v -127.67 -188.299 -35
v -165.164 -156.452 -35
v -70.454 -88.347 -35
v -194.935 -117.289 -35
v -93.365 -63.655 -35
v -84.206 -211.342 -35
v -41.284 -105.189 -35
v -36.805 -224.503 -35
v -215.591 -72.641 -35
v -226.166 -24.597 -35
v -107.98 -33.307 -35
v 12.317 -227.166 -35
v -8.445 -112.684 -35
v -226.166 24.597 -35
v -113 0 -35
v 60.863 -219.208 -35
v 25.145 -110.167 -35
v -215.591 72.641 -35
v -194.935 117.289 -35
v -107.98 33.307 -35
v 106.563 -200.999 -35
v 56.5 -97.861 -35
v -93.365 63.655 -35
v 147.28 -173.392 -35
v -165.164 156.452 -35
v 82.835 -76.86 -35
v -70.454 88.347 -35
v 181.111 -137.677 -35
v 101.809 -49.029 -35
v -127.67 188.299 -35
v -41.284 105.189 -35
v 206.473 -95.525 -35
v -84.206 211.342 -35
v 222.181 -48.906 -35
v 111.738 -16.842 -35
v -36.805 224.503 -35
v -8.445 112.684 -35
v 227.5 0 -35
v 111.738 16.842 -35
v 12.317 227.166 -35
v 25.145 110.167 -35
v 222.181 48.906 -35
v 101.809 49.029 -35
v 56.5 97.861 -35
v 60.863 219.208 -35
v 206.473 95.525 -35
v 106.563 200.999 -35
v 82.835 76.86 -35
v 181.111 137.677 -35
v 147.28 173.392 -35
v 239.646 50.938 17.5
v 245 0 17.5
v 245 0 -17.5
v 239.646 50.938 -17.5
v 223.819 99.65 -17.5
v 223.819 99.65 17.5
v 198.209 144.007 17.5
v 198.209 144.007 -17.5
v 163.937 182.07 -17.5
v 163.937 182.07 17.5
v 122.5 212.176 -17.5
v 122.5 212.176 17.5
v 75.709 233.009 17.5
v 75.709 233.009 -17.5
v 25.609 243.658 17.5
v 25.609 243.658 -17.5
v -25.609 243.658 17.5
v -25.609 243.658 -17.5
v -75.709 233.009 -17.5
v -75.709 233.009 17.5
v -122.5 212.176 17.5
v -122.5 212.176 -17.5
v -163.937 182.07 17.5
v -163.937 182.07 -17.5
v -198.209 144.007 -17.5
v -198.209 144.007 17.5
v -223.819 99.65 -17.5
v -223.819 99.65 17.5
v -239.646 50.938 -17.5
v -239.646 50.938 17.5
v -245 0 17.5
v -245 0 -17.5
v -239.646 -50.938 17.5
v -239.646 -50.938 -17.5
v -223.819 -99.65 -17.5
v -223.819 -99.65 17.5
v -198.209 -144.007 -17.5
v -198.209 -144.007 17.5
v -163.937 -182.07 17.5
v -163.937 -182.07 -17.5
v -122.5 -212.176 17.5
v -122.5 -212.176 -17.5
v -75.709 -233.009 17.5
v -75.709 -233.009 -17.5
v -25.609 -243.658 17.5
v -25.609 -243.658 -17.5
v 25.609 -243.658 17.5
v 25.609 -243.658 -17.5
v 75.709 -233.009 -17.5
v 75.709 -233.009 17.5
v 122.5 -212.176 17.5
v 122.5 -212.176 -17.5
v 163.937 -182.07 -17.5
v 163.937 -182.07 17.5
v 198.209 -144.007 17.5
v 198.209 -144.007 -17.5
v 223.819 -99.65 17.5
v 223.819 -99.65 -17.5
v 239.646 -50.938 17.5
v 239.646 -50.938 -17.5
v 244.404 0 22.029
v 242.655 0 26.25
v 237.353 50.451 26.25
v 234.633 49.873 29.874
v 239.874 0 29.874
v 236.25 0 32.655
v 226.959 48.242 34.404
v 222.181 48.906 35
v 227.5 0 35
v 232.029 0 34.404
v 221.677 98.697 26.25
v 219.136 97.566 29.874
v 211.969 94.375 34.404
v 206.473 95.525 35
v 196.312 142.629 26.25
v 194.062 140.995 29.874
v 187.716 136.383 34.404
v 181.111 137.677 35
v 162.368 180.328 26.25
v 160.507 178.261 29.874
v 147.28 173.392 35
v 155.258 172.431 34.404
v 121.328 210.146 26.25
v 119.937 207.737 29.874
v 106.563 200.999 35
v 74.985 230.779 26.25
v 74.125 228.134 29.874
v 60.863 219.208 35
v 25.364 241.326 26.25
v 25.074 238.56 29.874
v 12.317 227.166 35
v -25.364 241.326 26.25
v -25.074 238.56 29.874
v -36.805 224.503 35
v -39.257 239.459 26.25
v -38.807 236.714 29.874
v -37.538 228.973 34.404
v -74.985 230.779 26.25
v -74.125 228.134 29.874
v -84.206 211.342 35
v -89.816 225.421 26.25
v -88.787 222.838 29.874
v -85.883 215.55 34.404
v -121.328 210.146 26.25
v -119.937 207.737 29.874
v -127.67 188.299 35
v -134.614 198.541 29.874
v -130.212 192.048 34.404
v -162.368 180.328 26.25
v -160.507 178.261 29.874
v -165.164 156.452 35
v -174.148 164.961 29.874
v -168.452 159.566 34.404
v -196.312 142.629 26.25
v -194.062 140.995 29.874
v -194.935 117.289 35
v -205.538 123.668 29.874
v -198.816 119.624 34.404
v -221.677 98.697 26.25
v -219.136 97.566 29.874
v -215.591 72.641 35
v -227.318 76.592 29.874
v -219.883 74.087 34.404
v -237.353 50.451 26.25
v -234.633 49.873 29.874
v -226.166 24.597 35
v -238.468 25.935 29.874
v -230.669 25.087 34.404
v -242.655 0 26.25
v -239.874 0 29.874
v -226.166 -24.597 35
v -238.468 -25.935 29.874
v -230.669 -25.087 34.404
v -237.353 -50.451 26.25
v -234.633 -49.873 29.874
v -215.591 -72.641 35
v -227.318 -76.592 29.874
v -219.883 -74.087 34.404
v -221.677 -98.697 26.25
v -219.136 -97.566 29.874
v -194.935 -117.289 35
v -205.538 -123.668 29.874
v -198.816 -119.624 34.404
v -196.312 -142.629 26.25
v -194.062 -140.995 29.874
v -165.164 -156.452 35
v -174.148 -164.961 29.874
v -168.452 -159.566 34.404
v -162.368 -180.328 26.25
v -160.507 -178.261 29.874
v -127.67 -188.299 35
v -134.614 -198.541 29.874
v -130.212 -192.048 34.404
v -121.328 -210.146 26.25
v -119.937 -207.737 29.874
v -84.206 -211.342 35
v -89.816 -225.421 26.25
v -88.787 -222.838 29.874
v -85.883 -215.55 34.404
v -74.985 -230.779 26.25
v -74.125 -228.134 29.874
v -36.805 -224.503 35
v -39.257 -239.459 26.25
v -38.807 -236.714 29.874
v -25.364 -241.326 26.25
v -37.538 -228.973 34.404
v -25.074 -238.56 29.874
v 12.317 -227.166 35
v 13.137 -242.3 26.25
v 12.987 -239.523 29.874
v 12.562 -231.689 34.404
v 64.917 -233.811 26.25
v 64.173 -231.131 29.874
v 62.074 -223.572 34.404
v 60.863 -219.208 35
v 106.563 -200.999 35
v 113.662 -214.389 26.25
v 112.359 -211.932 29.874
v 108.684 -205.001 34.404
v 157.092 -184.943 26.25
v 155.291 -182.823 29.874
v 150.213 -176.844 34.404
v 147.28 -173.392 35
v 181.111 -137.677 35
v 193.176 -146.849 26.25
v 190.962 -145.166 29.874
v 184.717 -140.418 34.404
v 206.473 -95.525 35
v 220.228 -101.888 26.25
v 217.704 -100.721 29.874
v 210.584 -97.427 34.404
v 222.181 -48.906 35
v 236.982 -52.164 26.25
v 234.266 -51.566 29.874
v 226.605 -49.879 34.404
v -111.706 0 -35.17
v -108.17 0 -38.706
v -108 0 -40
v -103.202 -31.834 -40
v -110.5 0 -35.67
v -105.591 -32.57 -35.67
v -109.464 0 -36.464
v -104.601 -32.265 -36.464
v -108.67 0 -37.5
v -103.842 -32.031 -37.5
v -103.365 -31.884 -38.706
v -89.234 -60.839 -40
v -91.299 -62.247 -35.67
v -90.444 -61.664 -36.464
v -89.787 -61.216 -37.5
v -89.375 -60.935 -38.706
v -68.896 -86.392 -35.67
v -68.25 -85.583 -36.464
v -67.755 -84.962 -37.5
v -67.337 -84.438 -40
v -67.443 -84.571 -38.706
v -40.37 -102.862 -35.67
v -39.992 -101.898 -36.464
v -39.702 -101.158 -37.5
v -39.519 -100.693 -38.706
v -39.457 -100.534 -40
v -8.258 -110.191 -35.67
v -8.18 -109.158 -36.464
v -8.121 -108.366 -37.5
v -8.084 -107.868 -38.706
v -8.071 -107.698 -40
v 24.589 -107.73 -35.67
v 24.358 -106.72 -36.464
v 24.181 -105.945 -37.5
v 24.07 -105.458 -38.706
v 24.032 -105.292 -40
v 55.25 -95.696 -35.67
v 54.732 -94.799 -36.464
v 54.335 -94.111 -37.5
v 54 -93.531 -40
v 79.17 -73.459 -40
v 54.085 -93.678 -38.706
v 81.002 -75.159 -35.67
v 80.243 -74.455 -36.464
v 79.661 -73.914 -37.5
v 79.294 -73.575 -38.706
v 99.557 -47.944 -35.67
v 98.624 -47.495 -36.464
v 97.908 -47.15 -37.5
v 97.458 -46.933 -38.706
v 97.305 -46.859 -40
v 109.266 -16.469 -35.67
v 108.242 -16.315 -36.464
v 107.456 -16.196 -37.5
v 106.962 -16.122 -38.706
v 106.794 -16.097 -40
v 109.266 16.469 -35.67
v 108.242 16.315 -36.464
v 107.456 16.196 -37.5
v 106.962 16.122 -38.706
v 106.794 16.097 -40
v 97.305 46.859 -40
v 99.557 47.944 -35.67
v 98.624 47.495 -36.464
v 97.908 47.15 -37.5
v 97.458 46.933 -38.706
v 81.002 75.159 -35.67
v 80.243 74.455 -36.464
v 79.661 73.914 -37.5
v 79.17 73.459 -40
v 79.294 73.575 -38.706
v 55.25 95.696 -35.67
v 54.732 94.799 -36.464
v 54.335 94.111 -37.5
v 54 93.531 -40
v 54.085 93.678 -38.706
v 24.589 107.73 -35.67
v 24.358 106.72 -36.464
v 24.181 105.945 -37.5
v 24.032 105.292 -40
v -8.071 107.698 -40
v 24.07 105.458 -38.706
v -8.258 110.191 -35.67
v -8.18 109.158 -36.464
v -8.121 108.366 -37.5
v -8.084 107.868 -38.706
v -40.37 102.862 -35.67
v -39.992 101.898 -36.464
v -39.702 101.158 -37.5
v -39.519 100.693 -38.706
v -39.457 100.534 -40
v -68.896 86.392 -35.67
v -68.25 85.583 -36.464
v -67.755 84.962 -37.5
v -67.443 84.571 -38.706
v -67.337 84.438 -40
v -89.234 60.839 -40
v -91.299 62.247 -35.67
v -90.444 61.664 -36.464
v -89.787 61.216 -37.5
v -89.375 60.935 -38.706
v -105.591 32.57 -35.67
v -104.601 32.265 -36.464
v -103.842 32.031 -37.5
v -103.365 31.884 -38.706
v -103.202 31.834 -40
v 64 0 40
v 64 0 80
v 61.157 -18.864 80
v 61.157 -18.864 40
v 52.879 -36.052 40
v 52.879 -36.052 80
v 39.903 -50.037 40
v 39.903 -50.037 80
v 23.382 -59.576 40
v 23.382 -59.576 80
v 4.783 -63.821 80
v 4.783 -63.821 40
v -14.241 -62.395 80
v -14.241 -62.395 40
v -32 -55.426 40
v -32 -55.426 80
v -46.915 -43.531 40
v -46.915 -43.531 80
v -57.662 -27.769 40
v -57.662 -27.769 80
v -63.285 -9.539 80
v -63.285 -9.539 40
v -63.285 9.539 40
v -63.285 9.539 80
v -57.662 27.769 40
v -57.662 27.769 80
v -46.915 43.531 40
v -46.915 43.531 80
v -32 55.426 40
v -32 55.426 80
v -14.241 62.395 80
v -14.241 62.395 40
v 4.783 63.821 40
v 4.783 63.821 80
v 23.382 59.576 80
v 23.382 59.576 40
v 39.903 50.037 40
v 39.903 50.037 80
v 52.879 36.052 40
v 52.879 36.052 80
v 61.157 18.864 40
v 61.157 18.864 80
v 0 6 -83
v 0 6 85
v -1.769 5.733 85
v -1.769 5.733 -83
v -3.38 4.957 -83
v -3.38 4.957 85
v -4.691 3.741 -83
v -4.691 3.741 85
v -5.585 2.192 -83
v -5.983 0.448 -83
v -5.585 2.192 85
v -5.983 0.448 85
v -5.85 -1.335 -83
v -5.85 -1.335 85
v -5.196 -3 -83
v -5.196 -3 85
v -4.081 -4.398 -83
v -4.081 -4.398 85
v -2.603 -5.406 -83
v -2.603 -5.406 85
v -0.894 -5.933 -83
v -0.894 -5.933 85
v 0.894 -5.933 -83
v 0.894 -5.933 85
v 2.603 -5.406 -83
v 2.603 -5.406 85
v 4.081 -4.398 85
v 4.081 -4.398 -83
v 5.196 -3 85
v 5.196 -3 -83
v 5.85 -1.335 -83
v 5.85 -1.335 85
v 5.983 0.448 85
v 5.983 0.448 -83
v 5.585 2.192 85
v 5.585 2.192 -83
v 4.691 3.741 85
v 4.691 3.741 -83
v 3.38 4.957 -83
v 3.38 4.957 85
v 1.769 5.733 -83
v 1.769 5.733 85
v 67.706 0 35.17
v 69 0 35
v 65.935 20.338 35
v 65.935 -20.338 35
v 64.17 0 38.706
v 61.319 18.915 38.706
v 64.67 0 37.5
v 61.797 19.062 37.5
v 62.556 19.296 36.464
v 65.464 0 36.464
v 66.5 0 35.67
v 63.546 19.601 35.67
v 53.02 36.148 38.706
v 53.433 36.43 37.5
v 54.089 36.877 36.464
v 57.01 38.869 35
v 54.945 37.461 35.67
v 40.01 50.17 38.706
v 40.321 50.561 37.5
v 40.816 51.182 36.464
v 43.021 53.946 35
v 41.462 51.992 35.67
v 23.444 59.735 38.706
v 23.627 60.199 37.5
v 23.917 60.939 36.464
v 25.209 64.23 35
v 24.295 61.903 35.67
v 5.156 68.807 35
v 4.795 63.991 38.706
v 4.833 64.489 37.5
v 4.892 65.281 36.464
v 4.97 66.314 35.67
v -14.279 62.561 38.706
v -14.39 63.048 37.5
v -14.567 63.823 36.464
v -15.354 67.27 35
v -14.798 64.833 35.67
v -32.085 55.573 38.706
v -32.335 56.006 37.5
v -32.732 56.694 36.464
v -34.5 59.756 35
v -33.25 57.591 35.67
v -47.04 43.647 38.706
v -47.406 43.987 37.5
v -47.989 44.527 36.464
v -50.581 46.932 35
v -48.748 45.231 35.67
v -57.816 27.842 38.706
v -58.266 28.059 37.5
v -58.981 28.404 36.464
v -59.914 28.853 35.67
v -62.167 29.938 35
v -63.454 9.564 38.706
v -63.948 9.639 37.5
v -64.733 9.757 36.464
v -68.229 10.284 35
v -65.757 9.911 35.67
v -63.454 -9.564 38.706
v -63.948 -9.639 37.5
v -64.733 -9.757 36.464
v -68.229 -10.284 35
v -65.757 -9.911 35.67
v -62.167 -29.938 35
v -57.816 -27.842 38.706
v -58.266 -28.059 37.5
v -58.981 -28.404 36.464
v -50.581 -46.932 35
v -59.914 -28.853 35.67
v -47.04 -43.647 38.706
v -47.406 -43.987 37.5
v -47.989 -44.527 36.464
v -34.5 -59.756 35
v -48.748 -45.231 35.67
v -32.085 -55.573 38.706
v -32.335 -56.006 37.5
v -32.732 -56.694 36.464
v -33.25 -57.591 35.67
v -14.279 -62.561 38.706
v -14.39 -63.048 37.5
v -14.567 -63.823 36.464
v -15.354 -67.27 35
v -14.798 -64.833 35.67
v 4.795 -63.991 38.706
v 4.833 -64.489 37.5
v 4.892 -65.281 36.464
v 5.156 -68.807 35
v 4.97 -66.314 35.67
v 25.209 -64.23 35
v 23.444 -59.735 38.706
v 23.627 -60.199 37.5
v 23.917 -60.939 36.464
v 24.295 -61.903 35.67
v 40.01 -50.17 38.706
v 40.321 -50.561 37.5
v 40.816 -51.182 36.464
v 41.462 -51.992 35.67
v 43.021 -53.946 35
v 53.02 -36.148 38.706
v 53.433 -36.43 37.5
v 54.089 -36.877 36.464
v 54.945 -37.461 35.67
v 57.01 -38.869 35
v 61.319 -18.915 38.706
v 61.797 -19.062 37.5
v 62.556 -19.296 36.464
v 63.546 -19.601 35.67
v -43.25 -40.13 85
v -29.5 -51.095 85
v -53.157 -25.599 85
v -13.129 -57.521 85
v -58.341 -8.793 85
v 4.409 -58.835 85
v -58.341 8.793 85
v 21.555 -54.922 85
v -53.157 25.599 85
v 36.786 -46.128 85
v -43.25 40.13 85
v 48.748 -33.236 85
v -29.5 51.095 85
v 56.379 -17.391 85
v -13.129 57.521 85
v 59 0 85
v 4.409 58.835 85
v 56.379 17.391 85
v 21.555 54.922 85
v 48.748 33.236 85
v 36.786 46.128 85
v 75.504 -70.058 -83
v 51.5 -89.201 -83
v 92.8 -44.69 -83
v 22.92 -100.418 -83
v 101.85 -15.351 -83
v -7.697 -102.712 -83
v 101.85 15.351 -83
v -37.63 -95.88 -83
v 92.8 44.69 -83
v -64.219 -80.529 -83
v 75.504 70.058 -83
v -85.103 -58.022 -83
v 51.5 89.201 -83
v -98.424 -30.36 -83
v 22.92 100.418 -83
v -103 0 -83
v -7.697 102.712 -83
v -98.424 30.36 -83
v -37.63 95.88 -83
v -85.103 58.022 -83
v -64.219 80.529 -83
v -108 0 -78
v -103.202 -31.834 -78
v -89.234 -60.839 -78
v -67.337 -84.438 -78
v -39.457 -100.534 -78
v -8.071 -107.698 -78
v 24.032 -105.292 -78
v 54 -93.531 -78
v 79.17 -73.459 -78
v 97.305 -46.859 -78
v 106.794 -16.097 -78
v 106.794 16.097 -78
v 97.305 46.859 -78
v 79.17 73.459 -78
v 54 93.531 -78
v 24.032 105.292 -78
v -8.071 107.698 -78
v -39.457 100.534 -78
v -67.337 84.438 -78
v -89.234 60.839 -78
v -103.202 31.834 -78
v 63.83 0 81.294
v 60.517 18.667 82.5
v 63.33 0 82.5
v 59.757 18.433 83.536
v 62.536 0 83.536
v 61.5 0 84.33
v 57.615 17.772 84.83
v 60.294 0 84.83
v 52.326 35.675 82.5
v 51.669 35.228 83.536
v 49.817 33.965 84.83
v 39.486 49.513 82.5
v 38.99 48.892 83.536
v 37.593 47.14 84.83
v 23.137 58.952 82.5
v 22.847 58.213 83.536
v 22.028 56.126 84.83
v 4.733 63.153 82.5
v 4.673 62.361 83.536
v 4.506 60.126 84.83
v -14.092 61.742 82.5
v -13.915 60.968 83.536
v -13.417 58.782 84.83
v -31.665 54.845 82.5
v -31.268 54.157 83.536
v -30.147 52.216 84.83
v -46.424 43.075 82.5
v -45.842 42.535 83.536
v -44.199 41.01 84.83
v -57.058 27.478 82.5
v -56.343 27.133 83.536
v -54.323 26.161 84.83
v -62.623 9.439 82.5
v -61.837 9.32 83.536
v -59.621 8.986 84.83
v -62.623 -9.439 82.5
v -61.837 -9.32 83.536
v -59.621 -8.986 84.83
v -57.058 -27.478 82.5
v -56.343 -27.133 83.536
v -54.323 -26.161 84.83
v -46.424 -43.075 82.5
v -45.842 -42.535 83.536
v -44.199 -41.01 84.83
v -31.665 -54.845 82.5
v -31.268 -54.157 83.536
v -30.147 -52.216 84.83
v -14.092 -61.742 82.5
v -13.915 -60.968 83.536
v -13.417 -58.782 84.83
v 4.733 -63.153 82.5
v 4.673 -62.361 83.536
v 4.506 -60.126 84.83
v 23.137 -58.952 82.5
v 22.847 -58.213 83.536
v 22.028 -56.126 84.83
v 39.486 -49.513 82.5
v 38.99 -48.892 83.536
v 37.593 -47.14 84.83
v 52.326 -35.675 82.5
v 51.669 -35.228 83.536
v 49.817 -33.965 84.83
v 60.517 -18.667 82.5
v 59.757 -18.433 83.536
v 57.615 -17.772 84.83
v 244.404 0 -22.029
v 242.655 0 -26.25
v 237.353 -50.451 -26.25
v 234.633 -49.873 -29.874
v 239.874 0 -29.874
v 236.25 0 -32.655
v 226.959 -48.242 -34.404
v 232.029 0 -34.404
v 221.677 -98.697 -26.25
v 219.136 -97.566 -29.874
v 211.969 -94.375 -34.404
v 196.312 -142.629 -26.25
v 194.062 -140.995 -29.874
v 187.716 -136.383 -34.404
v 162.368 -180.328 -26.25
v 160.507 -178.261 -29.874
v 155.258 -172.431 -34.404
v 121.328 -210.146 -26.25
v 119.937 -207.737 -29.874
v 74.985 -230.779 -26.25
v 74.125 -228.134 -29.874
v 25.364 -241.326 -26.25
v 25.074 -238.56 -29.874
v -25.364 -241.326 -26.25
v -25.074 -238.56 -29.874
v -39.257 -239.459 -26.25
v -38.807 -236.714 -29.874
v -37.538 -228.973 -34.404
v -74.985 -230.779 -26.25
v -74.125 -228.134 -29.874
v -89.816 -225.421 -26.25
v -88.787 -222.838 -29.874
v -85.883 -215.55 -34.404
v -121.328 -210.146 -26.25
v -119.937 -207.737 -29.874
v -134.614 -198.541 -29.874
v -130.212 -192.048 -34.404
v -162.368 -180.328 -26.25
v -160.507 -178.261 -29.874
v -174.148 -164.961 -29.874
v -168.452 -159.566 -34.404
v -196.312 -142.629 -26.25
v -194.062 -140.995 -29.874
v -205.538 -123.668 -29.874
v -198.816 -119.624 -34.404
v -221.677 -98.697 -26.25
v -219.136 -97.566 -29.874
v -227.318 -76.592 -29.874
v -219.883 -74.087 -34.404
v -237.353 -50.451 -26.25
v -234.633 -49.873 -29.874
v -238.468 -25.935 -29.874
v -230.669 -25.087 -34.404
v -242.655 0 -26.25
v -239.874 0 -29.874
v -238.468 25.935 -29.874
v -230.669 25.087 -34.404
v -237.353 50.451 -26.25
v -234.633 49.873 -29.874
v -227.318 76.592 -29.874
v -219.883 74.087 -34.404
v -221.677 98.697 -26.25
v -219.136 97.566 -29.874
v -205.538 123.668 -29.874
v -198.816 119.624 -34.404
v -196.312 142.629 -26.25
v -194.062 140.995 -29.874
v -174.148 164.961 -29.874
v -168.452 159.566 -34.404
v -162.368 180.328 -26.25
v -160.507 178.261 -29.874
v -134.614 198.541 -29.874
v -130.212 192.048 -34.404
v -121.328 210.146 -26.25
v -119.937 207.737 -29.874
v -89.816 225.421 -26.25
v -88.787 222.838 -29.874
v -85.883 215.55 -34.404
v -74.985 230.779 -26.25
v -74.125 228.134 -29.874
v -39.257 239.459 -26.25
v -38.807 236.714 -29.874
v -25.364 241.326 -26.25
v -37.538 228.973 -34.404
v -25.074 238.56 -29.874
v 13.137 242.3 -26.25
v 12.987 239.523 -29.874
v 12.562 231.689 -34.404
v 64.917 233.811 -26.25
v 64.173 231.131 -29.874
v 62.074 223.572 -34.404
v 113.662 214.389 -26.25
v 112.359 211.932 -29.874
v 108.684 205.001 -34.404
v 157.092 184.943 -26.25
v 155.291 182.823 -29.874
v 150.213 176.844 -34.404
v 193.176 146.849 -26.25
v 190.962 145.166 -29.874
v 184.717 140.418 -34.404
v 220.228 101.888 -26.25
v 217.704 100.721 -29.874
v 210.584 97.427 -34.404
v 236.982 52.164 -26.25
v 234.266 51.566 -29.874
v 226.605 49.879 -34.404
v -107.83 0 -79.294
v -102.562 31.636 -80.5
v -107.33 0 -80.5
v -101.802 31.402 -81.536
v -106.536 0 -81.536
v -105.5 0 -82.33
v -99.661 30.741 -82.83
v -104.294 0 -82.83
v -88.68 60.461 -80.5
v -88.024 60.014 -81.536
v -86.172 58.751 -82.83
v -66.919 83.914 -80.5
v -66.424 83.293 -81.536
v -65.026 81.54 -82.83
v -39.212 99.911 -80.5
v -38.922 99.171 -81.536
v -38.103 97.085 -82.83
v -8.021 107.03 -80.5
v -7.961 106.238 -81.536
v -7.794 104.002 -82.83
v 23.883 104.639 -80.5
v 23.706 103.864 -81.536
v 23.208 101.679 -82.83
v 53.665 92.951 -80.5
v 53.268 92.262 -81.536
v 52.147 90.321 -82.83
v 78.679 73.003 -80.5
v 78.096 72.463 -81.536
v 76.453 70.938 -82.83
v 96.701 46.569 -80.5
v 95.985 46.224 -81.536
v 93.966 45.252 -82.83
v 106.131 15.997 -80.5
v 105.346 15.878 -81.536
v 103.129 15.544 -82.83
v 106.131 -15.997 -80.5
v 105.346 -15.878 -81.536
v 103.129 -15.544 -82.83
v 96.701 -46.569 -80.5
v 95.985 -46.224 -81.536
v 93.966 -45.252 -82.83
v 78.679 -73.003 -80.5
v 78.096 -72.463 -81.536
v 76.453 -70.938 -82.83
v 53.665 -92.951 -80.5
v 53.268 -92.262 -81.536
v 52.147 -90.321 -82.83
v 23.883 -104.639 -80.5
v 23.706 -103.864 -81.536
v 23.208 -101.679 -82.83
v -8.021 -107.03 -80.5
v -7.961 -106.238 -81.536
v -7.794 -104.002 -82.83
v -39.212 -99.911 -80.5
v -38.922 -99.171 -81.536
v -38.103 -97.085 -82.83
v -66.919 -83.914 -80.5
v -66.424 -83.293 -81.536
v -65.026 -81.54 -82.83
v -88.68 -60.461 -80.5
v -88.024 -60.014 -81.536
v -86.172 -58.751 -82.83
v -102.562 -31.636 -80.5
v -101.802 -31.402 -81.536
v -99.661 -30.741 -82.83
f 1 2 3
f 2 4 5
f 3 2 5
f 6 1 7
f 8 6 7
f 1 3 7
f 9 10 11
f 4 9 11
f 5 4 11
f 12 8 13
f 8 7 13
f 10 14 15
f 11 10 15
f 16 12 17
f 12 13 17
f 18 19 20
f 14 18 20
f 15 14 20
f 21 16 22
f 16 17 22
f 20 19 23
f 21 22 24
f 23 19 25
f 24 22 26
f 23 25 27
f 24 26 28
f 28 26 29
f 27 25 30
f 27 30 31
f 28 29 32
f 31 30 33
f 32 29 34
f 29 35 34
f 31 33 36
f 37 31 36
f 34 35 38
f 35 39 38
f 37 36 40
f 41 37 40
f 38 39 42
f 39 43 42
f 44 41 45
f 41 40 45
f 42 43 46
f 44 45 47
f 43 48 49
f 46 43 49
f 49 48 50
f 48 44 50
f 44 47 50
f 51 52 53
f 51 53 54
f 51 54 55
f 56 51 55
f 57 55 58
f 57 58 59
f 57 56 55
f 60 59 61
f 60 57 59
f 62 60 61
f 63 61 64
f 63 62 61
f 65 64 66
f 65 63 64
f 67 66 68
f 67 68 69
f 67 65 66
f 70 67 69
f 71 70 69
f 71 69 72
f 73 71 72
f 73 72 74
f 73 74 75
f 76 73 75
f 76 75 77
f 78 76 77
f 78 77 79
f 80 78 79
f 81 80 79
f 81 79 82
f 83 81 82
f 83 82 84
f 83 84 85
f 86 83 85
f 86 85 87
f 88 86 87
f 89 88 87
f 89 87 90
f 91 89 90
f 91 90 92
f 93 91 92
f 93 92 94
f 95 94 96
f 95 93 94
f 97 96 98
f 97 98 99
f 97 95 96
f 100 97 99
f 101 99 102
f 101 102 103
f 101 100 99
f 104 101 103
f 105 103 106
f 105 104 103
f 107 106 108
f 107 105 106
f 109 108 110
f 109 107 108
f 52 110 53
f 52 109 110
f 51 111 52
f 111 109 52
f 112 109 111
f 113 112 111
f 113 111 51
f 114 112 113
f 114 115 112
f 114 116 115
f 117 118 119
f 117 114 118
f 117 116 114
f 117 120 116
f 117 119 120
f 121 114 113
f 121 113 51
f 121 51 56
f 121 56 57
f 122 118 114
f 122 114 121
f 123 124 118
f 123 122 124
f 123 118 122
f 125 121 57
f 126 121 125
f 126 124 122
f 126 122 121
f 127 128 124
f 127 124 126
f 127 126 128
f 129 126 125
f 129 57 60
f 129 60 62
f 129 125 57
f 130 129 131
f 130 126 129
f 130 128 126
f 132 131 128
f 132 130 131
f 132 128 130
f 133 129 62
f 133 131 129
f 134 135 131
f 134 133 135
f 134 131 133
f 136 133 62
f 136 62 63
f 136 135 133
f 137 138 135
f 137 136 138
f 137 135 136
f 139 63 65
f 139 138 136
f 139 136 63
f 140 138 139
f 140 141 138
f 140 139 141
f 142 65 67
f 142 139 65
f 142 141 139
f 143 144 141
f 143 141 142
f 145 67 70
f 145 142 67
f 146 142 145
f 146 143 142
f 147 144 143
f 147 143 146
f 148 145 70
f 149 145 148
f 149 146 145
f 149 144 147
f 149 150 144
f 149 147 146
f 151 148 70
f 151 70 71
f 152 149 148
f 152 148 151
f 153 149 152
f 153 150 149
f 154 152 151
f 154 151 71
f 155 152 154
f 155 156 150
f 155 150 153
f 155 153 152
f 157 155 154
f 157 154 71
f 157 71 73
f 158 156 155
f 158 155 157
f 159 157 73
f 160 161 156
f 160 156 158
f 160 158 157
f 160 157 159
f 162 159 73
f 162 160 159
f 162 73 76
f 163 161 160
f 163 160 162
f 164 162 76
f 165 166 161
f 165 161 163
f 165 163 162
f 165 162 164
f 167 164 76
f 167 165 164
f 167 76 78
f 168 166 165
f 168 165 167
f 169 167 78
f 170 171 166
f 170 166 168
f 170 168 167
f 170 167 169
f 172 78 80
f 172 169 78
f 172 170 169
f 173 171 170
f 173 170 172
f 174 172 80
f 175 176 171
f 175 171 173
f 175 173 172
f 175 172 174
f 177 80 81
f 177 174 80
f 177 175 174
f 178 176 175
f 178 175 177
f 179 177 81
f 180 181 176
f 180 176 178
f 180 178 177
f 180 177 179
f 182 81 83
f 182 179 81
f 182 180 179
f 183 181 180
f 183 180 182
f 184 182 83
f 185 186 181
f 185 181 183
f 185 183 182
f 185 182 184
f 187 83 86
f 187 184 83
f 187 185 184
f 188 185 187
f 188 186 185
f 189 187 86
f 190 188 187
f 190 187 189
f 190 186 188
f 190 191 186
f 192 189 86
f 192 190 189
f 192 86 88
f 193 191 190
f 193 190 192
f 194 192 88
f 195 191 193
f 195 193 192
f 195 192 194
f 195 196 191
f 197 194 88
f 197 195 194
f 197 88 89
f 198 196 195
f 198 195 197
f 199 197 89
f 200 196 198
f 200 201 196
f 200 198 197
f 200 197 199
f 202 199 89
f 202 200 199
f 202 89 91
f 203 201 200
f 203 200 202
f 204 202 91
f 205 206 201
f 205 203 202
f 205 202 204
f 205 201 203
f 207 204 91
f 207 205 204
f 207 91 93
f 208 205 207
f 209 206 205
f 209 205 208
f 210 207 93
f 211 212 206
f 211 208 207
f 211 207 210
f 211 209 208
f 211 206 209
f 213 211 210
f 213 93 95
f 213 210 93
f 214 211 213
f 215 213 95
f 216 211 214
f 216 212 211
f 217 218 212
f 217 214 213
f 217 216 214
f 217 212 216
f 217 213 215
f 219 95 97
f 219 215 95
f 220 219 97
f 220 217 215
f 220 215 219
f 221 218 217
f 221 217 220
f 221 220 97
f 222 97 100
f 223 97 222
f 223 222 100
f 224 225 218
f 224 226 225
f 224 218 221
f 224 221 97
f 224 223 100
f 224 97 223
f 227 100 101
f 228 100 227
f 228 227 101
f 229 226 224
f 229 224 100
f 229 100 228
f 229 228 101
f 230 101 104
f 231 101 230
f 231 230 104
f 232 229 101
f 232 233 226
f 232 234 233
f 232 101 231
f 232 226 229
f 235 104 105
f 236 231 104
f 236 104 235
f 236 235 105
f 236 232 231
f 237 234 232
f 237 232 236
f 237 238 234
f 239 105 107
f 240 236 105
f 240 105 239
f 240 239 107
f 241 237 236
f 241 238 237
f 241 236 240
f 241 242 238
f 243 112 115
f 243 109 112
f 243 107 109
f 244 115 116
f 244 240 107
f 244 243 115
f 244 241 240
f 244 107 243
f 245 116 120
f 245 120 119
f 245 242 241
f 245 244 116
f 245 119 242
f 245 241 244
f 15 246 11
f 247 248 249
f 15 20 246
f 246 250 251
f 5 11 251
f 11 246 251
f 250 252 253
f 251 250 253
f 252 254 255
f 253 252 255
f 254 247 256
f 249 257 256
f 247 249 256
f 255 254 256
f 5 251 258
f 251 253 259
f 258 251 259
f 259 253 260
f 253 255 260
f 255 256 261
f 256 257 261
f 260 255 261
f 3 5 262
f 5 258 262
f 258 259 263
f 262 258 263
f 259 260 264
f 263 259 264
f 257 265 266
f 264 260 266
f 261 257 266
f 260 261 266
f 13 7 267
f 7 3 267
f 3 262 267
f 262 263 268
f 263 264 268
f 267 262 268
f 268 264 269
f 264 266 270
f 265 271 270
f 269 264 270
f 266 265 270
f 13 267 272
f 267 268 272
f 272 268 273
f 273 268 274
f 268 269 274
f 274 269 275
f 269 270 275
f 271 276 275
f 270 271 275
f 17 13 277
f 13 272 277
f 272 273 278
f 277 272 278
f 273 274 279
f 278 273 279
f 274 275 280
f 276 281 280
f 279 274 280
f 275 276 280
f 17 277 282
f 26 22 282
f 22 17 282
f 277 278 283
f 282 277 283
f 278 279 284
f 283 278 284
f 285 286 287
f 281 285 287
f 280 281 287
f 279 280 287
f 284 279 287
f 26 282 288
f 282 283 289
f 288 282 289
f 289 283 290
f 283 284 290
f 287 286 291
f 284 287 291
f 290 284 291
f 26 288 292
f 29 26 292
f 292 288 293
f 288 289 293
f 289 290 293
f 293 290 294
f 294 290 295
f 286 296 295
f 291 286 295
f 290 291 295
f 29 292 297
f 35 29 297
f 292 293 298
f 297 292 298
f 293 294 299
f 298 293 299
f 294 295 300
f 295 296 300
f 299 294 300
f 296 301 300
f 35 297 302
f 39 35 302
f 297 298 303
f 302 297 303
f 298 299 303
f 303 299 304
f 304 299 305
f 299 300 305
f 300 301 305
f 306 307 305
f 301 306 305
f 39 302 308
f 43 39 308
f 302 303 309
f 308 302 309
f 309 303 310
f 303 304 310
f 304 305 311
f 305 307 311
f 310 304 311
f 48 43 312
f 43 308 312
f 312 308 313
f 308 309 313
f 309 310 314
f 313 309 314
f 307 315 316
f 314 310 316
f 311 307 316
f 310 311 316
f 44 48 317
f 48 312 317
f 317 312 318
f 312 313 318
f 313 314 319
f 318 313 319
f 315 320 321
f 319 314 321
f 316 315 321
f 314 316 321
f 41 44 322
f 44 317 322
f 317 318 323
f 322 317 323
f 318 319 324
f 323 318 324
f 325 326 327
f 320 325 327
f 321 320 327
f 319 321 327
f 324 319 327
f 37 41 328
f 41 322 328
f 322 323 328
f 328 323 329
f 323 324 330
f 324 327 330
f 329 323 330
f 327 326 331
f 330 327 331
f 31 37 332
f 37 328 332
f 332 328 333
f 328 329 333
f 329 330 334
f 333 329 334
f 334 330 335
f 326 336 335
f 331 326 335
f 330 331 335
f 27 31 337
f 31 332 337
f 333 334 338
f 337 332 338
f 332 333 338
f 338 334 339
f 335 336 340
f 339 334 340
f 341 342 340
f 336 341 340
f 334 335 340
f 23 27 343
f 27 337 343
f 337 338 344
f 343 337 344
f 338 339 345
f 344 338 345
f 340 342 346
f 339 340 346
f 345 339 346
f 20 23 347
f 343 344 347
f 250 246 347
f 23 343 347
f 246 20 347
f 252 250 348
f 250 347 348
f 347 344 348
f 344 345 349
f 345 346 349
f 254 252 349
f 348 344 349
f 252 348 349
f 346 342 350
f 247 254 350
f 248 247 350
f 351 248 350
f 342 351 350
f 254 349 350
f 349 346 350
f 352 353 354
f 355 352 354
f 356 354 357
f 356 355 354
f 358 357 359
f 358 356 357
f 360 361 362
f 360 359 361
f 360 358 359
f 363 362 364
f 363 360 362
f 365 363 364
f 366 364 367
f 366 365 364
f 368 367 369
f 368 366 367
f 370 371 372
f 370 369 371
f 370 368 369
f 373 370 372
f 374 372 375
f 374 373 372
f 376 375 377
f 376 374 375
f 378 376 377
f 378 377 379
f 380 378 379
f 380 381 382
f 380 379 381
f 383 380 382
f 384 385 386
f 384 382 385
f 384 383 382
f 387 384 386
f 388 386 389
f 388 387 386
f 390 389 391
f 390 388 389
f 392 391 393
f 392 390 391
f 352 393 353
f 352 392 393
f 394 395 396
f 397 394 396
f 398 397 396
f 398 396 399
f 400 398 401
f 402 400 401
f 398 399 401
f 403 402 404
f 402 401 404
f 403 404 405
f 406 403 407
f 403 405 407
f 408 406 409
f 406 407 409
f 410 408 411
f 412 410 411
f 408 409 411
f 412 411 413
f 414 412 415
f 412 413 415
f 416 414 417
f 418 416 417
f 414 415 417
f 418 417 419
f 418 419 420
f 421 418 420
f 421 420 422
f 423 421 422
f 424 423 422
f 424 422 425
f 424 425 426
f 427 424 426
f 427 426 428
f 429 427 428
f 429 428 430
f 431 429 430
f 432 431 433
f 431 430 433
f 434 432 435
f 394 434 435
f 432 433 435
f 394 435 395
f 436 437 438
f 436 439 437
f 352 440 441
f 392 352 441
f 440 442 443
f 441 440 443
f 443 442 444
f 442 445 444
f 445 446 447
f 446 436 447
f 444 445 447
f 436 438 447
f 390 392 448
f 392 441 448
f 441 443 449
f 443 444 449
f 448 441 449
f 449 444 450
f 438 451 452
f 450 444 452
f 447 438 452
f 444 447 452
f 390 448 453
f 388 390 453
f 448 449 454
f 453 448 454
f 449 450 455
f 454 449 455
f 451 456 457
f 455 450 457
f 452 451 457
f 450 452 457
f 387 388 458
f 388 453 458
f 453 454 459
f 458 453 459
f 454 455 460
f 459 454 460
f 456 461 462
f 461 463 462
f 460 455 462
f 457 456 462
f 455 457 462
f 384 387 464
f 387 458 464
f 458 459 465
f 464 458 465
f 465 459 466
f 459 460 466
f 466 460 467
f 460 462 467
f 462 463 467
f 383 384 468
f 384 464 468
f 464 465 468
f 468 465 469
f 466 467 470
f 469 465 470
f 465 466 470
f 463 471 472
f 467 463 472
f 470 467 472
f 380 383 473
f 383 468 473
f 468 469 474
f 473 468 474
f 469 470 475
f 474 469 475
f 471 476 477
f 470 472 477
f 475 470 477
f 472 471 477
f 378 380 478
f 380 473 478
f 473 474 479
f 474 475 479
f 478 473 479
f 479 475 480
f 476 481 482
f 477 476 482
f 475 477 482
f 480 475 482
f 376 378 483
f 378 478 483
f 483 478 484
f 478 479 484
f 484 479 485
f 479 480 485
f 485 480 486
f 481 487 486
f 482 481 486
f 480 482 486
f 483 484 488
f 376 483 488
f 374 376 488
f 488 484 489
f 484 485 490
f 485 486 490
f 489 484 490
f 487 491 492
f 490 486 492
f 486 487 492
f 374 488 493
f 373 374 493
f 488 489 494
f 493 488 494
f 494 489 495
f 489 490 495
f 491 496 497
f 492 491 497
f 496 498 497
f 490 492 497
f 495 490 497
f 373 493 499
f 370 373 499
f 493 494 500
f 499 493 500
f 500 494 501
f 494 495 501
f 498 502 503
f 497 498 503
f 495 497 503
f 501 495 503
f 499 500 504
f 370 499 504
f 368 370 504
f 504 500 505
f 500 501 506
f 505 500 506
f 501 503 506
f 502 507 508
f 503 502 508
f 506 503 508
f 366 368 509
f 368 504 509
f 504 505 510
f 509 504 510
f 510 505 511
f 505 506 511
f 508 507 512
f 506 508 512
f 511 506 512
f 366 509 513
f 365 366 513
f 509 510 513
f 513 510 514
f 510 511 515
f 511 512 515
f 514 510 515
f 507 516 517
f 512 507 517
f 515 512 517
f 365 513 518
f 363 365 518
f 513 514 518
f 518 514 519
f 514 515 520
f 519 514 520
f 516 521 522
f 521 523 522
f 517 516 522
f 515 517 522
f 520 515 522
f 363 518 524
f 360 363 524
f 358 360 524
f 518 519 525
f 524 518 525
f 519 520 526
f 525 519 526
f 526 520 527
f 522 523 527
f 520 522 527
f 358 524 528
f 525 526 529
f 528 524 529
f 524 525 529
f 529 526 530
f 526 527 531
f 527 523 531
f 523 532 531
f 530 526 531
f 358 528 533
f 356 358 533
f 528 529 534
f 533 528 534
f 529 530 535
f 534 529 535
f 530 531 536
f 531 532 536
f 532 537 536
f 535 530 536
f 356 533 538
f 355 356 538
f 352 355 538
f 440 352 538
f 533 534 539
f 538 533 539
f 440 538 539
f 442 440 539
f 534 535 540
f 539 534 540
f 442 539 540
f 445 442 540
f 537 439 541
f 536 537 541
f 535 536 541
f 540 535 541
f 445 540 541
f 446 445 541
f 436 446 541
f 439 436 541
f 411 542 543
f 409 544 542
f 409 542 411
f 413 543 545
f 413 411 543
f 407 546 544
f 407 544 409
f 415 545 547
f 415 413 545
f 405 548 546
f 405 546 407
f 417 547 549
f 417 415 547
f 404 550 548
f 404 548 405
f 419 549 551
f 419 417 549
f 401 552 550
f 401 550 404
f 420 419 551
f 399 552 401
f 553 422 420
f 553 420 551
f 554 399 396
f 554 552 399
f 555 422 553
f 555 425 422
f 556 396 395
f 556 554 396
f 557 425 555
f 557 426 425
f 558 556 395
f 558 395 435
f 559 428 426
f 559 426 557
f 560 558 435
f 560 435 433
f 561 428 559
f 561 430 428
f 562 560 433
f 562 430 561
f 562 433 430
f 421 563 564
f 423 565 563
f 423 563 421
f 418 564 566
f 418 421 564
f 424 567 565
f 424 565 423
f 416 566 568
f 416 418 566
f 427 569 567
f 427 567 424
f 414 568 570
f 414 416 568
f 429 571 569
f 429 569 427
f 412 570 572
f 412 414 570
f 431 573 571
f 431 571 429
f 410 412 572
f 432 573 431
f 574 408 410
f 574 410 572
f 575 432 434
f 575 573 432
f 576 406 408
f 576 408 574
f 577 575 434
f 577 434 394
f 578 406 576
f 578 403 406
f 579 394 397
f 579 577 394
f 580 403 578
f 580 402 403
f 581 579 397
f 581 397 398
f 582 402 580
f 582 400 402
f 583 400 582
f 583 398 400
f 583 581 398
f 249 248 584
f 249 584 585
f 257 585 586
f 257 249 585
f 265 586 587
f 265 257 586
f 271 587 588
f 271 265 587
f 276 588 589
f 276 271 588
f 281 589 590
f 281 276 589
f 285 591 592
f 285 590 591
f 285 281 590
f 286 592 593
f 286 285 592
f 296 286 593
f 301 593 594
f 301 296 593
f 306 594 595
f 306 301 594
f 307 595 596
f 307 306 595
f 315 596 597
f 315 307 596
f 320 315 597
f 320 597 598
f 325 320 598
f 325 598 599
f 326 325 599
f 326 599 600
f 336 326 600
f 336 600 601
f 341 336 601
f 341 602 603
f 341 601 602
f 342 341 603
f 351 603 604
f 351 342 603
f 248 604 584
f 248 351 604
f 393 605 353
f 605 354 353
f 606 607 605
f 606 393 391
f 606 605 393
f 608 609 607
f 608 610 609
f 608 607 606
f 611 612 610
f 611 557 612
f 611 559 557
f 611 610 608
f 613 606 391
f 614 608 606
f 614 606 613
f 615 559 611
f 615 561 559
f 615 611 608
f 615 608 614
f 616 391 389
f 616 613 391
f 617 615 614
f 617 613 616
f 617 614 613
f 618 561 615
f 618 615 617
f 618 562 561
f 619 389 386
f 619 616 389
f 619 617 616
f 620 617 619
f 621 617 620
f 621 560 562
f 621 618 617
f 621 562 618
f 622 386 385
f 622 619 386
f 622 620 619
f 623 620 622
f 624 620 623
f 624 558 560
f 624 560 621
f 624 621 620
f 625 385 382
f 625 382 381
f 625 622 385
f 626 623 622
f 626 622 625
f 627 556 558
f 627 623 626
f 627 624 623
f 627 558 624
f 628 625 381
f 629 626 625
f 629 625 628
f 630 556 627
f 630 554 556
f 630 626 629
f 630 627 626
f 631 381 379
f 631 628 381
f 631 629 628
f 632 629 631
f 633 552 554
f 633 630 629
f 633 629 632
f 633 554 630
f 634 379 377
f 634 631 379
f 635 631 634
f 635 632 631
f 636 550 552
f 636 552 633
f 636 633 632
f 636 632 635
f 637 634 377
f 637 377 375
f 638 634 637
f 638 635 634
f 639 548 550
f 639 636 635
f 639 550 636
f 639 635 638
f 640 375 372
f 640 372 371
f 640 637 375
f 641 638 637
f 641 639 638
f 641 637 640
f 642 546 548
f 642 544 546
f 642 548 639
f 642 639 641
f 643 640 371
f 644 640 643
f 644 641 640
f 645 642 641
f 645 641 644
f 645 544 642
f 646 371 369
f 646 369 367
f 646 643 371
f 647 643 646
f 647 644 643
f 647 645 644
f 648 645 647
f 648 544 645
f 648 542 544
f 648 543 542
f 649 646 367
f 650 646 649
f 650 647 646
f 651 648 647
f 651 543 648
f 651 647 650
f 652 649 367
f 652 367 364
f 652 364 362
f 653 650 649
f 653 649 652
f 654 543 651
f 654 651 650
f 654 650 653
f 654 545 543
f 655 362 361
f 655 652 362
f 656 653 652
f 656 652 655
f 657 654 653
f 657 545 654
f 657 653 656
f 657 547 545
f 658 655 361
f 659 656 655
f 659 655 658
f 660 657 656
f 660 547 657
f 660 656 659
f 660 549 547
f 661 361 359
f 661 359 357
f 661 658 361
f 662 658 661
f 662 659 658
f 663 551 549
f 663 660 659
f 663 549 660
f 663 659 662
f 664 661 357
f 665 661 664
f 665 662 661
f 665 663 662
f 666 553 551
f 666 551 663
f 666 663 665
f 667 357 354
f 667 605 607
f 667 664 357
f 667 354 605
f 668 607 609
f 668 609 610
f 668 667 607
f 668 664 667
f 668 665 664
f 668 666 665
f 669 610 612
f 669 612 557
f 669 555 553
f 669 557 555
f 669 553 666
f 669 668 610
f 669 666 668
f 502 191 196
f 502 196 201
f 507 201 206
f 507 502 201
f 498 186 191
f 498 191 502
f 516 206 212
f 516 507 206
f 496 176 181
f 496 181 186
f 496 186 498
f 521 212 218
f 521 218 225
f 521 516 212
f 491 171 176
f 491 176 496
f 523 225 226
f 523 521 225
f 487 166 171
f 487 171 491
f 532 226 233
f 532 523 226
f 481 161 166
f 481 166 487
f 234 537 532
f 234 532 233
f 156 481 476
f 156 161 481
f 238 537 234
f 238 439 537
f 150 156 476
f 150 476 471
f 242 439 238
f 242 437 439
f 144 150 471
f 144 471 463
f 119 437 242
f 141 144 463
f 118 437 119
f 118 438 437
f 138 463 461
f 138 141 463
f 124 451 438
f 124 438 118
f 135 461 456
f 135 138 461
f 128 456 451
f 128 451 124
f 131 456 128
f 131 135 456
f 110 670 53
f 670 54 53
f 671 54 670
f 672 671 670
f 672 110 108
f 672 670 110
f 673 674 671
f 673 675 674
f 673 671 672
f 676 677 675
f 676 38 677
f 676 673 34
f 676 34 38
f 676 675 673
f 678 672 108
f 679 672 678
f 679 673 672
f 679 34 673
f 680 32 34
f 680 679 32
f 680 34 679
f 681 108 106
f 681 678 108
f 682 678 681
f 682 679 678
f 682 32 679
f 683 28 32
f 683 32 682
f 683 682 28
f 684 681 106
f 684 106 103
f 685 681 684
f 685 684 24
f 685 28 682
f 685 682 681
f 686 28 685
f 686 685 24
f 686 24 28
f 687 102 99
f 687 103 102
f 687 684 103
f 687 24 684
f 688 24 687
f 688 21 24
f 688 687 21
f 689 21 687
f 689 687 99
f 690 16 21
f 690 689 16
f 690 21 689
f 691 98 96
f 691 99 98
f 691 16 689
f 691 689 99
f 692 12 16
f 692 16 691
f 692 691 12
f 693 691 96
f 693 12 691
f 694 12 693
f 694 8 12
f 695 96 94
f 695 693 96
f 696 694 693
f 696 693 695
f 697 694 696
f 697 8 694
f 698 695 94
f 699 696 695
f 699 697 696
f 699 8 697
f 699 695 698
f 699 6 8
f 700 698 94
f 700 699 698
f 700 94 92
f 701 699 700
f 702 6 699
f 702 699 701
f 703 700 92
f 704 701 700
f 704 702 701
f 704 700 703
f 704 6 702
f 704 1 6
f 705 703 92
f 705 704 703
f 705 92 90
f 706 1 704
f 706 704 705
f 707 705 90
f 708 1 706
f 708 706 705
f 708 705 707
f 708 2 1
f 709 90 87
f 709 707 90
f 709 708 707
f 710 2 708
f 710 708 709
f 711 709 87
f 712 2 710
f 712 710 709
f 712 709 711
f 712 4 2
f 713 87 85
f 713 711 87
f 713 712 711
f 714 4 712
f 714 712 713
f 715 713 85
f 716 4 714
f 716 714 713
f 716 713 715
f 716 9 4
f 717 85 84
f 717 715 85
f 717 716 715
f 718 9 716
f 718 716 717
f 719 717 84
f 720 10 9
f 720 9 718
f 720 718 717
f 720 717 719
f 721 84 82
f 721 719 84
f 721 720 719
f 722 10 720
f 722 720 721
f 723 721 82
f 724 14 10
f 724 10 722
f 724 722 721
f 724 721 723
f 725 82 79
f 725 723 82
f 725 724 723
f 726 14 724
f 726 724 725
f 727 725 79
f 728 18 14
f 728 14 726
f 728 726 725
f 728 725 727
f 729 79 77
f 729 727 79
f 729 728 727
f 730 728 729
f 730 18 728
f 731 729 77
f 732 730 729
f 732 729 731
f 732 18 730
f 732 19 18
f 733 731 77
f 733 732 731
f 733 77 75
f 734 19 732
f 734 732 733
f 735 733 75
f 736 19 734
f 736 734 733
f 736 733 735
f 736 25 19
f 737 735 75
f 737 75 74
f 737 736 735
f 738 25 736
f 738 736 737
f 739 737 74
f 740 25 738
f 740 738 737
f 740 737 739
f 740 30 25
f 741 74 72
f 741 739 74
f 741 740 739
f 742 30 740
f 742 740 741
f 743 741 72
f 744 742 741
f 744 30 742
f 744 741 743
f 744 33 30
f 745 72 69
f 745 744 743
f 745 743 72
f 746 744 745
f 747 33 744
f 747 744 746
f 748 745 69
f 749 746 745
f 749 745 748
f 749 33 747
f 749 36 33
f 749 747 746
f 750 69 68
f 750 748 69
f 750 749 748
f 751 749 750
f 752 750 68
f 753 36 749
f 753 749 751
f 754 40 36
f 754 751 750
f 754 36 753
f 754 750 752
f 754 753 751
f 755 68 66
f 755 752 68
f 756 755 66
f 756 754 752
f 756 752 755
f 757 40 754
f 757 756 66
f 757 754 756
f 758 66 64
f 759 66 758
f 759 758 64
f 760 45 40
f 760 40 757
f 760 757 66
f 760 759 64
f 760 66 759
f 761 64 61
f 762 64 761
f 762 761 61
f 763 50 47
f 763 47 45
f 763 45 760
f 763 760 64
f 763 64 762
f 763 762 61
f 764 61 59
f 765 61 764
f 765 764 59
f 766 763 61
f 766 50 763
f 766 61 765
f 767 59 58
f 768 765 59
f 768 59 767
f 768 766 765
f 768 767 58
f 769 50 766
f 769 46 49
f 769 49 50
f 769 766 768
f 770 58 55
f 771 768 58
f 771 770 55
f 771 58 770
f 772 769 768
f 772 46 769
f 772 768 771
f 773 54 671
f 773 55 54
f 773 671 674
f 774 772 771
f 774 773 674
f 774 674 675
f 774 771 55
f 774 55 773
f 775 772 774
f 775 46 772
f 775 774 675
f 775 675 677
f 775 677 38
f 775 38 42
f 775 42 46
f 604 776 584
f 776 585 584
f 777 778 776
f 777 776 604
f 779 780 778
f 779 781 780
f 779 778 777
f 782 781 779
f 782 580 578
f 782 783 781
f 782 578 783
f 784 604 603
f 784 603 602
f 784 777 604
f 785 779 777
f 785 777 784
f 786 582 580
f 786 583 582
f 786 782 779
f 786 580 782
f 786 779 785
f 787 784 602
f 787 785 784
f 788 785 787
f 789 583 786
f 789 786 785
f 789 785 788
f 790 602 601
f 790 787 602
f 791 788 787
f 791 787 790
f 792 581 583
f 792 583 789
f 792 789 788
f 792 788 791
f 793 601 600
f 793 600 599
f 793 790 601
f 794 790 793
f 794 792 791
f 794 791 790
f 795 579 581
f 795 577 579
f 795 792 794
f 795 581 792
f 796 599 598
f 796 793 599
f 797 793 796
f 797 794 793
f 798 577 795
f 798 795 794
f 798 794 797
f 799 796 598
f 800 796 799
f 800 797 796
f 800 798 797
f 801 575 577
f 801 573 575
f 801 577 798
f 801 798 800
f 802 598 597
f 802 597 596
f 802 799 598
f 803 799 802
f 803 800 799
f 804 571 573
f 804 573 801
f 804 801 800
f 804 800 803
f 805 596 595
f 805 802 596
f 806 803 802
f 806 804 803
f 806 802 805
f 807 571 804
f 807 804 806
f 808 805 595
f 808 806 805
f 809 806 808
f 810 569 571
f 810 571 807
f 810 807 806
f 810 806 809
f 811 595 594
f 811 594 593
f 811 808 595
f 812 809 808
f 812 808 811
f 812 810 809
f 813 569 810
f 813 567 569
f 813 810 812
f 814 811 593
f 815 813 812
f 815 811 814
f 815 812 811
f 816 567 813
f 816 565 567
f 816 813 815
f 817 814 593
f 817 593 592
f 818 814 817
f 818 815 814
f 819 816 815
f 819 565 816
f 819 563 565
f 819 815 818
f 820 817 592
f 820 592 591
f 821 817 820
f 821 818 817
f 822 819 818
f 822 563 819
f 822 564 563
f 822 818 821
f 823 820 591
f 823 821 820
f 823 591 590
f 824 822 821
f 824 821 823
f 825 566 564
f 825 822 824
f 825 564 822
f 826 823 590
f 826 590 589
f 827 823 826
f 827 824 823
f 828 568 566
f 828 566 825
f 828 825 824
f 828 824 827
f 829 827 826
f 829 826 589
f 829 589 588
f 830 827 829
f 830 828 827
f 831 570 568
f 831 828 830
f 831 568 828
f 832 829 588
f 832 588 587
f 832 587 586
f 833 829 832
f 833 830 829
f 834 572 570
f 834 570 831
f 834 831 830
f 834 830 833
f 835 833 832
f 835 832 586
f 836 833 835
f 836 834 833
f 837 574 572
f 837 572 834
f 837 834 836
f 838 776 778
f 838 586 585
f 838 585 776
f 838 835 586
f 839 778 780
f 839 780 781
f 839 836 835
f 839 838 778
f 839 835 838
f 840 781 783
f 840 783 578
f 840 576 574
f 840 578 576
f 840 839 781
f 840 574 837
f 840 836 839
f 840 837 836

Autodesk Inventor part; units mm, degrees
ref_plane "YZ Plane" through (0, 0, 0) normal (1, 0, 0) x (0, 1, 0)
ref_plane "XZ Plane" through (0, 0, 0) normal (0, 1, 0) x (-1, 0, 0)
ref_plane "XY Plane" through (0, 0, 0) normal (0, 0, 1) x (1, 0, 0)
sketch "スケッチ1" plane through (0, 0, 0) normal (0, 0, 1) x (1, 0, 0)
  circle A0 centre (0, 0) radius 245
  dimension "d0" = 490
extrude "押し出し1" add sketch "スケッチ1" along normal mid plane 70
fillet "フィレット1" radius 17.5 2 edges at (-245, 0, 35) (-245, 0, -35)
sketch "スケッチ8" plane through (0, 0, 35) normal (0, 0, 1) x (1, 0, 0)
  circle A0 centre (0, 0) radius 64
  dimension "d11" = 128
extrude "押し出し2" add sketch "スケッチ8" along normal blind 50
sketch "スケッチ9" plane through (0, 0, -35) normal (0, 0, -1) x (-1, 0, 0)
  circle A0 centre (0, 0) radius 108
  dimension "d14" = 216
extrude "押し出し3" add sketch "スケッチ9" along normal blind 48
fillet "フィレット2" radius 5 1 edges at (-64, 0, 85)
fillet "フィレット3" radius 5 1 edges at (-64, 0, 35)
fillet "フィレット4" radius 5 2 edges at (108, 0, -83) (108, 0, -35)
sketch "スケッチ10" plane through (0, 0, -83) normal (0, 0, -1) x (-1, 0, 0)
  point P0 (0, 0)
  point P1 (0, 0)
hole "穴2" at (0, 0, -83) direction (0, 0, 1) diameter 12 end through all
sketch "スケッチ12" plane through (0, 0, 85) normal (0, 0, 1) x (1, 0, 0)
  line L0 (-51.2549, 22.4229) -> (29.3453, 22.4229) construction
  line L1 (29.3453, 22.4229) -> (29.3453, -28.267) construction
  line L2 (29.3453, -28.267) -> (-51.2549, -28.267) construction
  line L3 (-51.2549, -28.267) -> (-51.2549, 22.4229) construction
  point P0 (0, 0)
sketch "スケッチ13" plane through (0, 0, -83) normal (0, 0, -1) x (-1, 0, 0)
  line L0 (-79.0903, 45.7594) -> (75.7007, 45.7594) construction
  line L1 (75.7007, 45.7594) -> (75.7007, -24.292) construction
  line L2 (75.7007, -24.292) -> (-79.0903, -24.292) construction
  line L3 (-79.0903, -24.292) -> (-79.0903, 45.7594) construction
  point P0 (0, 0)
sketch "スケッチ14" plane through (0, 0, -35) normal (0, 0, -1) x (-1, 0, 0)
  line L0 (-67.9, 178.6198) -> (94.9078, 178.6198) construction
  line L1 (94.9078, 178.6198) -> (94.9078, 134.9225) construction
  line L2 (94.9078, 134.9225) -> (-67.9, 134.9225) construction
  line L3 (-67.9, 134.9225) -> (-67.9, 178.6198) construction
  point P0 (0, 0)
properties part number "前輪"
